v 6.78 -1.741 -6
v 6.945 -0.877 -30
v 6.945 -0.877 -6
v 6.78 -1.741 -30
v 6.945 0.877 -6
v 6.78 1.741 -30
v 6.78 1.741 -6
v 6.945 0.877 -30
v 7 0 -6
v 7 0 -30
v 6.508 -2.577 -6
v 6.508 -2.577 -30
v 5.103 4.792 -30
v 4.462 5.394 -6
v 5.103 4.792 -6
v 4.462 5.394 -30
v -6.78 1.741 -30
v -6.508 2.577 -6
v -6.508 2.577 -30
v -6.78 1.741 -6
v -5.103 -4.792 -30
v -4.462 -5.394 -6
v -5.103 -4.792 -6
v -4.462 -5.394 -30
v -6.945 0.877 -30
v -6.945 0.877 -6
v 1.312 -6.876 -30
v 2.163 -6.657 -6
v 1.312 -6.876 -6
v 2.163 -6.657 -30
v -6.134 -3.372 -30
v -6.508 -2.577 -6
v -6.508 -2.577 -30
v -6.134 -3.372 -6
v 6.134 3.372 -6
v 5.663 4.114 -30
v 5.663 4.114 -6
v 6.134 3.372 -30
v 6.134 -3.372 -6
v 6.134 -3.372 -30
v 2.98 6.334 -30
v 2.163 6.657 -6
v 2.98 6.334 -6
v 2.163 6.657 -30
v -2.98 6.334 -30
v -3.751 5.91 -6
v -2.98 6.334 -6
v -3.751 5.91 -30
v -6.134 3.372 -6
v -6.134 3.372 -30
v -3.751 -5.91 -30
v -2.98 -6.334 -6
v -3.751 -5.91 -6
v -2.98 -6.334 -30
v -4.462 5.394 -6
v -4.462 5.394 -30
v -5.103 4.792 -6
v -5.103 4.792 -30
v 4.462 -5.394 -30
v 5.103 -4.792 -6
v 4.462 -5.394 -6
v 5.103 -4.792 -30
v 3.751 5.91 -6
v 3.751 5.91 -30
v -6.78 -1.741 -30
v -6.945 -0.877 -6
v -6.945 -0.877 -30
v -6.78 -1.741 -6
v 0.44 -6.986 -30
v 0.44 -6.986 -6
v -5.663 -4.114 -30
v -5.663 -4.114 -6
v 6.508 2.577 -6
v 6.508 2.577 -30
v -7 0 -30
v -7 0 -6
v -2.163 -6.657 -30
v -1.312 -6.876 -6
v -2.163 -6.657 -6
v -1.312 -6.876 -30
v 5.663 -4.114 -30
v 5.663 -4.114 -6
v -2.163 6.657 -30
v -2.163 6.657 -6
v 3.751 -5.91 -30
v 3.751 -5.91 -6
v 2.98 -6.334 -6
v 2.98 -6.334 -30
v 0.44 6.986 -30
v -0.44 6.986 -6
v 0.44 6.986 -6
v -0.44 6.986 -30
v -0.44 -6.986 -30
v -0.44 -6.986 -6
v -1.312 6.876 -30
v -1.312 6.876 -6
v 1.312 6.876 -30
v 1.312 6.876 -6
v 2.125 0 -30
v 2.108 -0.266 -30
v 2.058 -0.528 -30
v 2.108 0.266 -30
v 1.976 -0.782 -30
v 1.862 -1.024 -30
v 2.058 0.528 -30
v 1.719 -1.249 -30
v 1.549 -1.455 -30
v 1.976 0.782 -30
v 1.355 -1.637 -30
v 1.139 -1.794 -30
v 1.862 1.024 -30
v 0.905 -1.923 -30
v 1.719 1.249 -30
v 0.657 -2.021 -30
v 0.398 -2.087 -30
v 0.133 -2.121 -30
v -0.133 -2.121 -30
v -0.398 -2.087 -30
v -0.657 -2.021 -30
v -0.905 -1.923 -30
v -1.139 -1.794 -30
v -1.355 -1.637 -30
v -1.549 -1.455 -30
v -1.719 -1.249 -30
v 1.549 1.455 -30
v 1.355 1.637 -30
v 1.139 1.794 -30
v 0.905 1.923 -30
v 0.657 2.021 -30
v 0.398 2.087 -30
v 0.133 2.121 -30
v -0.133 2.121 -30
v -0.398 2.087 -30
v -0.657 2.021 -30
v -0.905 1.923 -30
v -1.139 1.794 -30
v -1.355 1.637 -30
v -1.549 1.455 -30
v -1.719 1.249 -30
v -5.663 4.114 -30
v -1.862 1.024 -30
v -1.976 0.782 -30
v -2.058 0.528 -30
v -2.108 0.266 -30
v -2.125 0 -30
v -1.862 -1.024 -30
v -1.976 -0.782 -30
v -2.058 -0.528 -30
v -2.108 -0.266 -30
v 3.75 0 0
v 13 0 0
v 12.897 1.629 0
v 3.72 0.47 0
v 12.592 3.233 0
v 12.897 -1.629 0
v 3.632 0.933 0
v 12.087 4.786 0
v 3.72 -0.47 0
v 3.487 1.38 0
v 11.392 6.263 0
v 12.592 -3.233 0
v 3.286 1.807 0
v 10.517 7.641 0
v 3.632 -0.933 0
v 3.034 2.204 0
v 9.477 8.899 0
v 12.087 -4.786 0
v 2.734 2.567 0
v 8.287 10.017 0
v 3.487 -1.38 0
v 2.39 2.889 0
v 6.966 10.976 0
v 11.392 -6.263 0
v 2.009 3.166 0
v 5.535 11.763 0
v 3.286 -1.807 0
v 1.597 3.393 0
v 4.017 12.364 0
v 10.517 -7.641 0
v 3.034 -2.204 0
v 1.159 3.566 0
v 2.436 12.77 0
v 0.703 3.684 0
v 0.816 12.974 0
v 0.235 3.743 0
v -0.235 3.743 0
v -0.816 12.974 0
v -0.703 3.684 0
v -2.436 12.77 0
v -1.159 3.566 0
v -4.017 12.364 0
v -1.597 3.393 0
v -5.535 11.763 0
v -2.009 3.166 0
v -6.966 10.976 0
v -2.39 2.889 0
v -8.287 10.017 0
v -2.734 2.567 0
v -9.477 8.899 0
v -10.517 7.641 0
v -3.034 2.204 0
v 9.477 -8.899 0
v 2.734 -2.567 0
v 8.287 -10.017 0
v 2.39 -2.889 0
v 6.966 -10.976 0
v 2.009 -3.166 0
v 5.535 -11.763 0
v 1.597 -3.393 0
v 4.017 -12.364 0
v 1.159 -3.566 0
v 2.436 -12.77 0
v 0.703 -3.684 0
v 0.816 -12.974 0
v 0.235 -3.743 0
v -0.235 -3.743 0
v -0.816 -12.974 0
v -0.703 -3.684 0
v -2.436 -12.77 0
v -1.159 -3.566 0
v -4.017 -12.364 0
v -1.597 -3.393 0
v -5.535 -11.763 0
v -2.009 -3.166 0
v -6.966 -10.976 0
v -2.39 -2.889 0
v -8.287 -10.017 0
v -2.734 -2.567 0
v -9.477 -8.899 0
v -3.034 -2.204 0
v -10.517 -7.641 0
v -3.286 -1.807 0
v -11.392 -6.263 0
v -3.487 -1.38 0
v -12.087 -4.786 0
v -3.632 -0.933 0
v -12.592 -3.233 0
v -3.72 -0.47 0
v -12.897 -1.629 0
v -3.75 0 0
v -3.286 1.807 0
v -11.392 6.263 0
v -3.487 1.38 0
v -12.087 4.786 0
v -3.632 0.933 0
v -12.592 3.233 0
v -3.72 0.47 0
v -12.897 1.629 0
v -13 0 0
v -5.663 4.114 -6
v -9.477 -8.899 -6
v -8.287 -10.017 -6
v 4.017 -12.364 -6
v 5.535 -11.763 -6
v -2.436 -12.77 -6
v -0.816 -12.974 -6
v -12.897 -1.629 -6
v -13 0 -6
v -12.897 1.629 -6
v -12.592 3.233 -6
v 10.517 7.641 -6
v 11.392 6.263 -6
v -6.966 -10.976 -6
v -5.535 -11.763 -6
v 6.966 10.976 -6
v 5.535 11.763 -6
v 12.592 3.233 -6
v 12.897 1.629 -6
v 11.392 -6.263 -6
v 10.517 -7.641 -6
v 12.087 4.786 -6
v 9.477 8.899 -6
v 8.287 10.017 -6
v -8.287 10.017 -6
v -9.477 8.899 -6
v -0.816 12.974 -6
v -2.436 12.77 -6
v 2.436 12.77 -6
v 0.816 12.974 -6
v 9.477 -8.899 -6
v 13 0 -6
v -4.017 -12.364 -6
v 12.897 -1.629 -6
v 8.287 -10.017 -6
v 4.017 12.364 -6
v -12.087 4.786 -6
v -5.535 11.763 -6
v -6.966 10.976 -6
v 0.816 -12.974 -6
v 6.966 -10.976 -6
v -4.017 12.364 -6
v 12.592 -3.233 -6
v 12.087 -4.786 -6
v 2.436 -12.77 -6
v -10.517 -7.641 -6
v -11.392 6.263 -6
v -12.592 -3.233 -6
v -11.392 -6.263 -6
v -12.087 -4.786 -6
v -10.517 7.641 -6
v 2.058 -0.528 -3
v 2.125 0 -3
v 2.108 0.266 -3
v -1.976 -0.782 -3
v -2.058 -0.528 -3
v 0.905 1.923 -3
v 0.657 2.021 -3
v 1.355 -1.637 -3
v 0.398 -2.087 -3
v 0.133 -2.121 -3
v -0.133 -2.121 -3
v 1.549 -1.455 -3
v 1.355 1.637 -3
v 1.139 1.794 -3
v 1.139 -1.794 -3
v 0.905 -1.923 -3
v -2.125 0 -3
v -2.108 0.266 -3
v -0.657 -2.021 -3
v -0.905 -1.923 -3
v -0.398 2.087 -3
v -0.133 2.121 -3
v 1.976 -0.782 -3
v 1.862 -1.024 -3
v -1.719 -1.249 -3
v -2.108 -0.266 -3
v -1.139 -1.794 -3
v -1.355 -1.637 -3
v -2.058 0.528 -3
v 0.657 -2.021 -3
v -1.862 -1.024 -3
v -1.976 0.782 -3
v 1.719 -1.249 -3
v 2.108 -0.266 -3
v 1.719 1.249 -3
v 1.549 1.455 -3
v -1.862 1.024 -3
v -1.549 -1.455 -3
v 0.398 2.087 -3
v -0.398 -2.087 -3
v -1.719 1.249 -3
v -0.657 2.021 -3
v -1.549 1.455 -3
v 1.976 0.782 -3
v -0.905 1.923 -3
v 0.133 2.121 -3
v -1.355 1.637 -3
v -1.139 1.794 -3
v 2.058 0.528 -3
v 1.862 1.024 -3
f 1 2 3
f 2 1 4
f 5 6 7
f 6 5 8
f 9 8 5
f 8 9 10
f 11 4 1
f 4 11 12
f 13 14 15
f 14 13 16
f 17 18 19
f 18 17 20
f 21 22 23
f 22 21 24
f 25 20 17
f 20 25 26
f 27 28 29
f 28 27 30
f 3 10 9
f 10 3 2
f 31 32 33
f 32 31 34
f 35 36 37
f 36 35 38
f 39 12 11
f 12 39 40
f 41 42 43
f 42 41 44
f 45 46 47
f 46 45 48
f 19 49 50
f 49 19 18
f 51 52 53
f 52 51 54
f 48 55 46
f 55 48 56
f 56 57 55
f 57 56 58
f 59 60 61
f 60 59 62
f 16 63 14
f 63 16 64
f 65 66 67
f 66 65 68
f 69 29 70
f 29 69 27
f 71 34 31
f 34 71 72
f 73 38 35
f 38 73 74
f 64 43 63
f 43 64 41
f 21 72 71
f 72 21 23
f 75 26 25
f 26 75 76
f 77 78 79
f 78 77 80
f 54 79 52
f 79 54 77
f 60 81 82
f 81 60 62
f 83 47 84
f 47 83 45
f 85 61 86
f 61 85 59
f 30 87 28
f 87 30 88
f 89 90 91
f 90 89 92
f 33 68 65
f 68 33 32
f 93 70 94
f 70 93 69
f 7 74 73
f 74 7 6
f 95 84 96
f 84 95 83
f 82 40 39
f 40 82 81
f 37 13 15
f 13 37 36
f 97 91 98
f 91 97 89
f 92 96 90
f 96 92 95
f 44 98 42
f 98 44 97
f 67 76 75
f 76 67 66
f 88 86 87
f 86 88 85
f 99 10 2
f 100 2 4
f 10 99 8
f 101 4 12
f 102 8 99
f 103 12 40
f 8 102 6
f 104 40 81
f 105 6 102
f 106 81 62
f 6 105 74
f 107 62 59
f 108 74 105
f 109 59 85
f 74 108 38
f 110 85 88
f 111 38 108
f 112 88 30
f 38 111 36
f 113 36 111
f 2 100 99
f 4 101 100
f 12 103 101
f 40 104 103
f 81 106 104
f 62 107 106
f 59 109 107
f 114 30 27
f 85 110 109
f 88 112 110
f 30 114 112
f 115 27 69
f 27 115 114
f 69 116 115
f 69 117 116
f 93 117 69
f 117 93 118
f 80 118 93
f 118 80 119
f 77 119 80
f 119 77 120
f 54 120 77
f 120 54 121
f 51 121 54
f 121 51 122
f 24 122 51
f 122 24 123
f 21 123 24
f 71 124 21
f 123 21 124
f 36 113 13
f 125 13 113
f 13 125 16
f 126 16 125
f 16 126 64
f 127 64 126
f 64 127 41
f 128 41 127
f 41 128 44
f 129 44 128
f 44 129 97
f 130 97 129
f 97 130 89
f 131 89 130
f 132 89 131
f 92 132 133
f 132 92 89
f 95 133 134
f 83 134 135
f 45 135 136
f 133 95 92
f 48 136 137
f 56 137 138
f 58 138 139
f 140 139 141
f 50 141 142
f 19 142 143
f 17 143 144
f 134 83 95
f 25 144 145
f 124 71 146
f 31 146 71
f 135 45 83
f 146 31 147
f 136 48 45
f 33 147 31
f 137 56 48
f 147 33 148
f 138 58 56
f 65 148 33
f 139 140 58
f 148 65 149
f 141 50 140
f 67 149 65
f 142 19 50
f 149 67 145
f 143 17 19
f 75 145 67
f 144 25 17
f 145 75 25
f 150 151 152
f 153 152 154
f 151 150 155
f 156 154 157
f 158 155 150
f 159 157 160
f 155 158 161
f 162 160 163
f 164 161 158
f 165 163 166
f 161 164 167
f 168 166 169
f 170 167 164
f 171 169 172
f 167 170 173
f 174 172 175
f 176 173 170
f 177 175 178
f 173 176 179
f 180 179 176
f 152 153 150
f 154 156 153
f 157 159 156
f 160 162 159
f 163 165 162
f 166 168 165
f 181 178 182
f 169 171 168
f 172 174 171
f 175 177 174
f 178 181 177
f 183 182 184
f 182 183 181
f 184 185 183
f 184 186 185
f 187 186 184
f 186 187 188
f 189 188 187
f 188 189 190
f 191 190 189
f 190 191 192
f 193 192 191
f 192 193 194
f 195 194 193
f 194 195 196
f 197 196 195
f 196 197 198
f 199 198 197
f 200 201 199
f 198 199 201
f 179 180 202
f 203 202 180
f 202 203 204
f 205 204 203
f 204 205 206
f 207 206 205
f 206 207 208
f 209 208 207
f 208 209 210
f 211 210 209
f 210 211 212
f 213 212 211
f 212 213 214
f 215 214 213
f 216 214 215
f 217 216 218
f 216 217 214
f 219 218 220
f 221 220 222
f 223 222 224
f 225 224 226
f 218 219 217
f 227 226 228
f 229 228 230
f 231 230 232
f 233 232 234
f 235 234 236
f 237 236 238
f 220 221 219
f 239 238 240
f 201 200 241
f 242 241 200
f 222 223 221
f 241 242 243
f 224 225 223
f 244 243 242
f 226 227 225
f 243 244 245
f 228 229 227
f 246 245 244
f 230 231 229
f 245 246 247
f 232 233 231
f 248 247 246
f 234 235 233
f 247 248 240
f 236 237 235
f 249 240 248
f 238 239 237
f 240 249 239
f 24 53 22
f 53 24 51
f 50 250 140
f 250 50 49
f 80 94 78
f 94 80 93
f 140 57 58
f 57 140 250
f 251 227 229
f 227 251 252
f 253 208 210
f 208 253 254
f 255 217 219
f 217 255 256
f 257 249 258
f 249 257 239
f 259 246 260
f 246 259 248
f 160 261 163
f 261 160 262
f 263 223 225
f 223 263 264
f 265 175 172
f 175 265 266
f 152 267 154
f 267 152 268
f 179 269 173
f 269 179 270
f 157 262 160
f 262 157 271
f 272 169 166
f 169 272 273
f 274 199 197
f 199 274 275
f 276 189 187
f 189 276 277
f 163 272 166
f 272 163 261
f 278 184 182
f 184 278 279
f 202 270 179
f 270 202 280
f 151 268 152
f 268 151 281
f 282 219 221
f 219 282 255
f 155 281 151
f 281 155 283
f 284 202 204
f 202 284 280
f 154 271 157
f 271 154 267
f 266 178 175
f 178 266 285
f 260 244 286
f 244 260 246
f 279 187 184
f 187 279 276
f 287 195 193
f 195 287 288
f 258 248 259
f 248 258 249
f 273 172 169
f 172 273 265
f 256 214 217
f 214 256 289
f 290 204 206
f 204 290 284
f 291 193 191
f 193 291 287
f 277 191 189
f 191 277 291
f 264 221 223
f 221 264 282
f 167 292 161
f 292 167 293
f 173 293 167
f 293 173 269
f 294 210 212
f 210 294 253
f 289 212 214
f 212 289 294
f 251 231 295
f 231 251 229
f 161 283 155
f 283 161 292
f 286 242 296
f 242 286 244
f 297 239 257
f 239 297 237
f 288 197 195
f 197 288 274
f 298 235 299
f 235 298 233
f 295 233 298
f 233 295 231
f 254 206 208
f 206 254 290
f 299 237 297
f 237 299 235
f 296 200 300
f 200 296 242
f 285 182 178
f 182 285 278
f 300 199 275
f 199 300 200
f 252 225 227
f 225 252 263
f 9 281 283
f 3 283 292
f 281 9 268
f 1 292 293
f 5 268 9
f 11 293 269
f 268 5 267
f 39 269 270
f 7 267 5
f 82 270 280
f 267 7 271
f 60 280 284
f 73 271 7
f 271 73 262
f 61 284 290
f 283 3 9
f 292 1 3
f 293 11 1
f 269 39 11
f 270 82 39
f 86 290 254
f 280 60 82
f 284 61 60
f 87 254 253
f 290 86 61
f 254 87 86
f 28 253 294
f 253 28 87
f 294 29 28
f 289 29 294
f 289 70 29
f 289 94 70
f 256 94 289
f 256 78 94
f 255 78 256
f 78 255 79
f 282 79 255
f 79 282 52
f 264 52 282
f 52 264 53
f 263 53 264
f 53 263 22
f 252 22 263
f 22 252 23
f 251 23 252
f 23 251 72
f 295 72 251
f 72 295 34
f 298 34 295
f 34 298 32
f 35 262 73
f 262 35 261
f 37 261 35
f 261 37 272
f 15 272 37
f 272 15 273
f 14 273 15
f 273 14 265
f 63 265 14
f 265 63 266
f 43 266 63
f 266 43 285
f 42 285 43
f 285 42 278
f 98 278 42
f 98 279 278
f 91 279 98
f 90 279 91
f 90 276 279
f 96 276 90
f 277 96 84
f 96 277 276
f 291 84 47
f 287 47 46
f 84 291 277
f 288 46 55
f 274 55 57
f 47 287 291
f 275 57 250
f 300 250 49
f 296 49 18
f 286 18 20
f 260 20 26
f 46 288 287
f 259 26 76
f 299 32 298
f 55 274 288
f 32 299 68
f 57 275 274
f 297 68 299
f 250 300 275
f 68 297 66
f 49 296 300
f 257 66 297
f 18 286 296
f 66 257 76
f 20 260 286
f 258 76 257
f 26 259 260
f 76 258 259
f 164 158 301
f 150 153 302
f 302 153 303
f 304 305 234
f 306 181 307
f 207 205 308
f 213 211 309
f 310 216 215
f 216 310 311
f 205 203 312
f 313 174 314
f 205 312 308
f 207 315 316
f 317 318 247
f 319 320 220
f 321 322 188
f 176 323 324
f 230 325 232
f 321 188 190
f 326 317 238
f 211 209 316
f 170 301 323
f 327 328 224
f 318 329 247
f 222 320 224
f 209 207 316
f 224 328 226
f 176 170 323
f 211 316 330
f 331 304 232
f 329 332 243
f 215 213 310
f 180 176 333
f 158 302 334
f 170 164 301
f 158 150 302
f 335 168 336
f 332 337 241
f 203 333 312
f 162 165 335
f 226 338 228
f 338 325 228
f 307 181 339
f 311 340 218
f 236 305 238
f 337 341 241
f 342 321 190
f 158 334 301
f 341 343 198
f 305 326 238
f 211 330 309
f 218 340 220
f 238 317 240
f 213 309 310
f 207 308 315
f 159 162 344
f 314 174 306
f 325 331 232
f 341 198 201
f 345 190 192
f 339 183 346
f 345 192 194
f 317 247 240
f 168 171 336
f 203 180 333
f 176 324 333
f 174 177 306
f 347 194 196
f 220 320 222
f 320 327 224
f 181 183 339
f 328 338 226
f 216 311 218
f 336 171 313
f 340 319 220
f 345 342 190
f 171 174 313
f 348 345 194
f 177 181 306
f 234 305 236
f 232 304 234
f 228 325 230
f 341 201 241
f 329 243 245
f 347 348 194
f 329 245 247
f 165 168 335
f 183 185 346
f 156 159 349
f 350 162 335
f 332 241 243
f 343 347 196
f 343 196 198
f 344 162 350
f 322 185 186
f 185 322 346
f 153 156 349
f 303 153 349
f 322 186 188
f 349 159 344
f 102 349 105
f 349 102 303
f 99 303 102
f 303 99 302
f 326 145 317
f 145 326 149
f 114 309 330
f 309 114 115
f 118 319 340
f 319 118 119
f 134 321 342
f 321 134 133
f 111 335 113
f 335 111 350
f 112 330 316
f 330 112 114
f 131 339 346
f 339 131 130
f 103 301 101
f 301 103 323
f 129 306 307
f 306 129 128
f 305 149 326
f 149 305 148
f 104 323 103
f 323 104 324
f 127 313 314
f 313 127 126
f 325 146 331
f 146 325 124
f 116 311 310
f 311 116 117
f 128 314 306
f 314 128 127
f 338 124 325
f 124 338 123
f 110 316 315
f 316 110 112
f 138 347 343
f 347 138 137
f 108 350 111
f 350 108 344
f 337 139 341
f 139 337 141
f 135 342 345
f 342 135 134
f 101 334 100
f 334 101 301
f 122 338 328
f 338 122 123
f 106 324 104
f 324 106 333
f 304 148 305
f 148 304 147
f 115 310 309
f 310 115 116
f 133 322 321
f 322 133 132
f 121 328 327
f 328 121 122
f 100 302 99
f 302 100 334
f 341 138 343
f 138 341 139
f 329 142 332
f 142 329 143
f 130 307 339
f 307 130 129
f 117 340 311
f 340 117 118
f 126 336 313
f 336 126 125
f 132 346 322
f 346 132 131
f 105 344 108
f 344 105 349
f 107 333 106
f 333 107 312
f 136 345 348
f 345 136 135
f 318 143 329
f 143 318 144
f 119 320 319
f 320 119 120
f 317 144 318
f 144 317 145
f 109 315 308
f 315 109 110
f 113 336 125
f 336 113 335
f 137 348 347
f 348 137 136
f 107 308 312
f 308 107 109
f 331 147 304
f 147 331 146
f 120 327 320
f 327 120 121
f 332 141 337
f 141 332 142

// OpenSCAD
$fn = 50;


difference() {
	union() {
		translate(v = [0, 0, -30.0000000000]) {
			cylinder(h = 30, r = 7.0000000000);
		}
		translate(v = [0, 0, -6.0000000000]) {
			cylinder(h = 6, r = 13.0000000000);
		}
	}
	union() {
		translate(v = [0, 0, 0]) {
			rotate(a = [0, 0, 0]) {
				difference() {
					union() {
						#translate(v = [0, 0, -30.0000000000]) {
							cylinder(h = 30, r = 2.0000000000);
						}
						#translate(v = [0, 0, -3]) {
							cylinder(h = 3, r = 7.0000000000, r1 = 2.1250000000, r2 = 3.7500000000);
						}
						#translate(v = [0, 0, -30.0000000000]) {
							cylinder(h = 30, r = 2.1250000000);
						}
						#translate(v = [0, 0, -30.0000000000]) {
							cylinder(h = 30, r = 2.0000000000);
						}
					}
					union();
				}
			}
		}
	}
}
